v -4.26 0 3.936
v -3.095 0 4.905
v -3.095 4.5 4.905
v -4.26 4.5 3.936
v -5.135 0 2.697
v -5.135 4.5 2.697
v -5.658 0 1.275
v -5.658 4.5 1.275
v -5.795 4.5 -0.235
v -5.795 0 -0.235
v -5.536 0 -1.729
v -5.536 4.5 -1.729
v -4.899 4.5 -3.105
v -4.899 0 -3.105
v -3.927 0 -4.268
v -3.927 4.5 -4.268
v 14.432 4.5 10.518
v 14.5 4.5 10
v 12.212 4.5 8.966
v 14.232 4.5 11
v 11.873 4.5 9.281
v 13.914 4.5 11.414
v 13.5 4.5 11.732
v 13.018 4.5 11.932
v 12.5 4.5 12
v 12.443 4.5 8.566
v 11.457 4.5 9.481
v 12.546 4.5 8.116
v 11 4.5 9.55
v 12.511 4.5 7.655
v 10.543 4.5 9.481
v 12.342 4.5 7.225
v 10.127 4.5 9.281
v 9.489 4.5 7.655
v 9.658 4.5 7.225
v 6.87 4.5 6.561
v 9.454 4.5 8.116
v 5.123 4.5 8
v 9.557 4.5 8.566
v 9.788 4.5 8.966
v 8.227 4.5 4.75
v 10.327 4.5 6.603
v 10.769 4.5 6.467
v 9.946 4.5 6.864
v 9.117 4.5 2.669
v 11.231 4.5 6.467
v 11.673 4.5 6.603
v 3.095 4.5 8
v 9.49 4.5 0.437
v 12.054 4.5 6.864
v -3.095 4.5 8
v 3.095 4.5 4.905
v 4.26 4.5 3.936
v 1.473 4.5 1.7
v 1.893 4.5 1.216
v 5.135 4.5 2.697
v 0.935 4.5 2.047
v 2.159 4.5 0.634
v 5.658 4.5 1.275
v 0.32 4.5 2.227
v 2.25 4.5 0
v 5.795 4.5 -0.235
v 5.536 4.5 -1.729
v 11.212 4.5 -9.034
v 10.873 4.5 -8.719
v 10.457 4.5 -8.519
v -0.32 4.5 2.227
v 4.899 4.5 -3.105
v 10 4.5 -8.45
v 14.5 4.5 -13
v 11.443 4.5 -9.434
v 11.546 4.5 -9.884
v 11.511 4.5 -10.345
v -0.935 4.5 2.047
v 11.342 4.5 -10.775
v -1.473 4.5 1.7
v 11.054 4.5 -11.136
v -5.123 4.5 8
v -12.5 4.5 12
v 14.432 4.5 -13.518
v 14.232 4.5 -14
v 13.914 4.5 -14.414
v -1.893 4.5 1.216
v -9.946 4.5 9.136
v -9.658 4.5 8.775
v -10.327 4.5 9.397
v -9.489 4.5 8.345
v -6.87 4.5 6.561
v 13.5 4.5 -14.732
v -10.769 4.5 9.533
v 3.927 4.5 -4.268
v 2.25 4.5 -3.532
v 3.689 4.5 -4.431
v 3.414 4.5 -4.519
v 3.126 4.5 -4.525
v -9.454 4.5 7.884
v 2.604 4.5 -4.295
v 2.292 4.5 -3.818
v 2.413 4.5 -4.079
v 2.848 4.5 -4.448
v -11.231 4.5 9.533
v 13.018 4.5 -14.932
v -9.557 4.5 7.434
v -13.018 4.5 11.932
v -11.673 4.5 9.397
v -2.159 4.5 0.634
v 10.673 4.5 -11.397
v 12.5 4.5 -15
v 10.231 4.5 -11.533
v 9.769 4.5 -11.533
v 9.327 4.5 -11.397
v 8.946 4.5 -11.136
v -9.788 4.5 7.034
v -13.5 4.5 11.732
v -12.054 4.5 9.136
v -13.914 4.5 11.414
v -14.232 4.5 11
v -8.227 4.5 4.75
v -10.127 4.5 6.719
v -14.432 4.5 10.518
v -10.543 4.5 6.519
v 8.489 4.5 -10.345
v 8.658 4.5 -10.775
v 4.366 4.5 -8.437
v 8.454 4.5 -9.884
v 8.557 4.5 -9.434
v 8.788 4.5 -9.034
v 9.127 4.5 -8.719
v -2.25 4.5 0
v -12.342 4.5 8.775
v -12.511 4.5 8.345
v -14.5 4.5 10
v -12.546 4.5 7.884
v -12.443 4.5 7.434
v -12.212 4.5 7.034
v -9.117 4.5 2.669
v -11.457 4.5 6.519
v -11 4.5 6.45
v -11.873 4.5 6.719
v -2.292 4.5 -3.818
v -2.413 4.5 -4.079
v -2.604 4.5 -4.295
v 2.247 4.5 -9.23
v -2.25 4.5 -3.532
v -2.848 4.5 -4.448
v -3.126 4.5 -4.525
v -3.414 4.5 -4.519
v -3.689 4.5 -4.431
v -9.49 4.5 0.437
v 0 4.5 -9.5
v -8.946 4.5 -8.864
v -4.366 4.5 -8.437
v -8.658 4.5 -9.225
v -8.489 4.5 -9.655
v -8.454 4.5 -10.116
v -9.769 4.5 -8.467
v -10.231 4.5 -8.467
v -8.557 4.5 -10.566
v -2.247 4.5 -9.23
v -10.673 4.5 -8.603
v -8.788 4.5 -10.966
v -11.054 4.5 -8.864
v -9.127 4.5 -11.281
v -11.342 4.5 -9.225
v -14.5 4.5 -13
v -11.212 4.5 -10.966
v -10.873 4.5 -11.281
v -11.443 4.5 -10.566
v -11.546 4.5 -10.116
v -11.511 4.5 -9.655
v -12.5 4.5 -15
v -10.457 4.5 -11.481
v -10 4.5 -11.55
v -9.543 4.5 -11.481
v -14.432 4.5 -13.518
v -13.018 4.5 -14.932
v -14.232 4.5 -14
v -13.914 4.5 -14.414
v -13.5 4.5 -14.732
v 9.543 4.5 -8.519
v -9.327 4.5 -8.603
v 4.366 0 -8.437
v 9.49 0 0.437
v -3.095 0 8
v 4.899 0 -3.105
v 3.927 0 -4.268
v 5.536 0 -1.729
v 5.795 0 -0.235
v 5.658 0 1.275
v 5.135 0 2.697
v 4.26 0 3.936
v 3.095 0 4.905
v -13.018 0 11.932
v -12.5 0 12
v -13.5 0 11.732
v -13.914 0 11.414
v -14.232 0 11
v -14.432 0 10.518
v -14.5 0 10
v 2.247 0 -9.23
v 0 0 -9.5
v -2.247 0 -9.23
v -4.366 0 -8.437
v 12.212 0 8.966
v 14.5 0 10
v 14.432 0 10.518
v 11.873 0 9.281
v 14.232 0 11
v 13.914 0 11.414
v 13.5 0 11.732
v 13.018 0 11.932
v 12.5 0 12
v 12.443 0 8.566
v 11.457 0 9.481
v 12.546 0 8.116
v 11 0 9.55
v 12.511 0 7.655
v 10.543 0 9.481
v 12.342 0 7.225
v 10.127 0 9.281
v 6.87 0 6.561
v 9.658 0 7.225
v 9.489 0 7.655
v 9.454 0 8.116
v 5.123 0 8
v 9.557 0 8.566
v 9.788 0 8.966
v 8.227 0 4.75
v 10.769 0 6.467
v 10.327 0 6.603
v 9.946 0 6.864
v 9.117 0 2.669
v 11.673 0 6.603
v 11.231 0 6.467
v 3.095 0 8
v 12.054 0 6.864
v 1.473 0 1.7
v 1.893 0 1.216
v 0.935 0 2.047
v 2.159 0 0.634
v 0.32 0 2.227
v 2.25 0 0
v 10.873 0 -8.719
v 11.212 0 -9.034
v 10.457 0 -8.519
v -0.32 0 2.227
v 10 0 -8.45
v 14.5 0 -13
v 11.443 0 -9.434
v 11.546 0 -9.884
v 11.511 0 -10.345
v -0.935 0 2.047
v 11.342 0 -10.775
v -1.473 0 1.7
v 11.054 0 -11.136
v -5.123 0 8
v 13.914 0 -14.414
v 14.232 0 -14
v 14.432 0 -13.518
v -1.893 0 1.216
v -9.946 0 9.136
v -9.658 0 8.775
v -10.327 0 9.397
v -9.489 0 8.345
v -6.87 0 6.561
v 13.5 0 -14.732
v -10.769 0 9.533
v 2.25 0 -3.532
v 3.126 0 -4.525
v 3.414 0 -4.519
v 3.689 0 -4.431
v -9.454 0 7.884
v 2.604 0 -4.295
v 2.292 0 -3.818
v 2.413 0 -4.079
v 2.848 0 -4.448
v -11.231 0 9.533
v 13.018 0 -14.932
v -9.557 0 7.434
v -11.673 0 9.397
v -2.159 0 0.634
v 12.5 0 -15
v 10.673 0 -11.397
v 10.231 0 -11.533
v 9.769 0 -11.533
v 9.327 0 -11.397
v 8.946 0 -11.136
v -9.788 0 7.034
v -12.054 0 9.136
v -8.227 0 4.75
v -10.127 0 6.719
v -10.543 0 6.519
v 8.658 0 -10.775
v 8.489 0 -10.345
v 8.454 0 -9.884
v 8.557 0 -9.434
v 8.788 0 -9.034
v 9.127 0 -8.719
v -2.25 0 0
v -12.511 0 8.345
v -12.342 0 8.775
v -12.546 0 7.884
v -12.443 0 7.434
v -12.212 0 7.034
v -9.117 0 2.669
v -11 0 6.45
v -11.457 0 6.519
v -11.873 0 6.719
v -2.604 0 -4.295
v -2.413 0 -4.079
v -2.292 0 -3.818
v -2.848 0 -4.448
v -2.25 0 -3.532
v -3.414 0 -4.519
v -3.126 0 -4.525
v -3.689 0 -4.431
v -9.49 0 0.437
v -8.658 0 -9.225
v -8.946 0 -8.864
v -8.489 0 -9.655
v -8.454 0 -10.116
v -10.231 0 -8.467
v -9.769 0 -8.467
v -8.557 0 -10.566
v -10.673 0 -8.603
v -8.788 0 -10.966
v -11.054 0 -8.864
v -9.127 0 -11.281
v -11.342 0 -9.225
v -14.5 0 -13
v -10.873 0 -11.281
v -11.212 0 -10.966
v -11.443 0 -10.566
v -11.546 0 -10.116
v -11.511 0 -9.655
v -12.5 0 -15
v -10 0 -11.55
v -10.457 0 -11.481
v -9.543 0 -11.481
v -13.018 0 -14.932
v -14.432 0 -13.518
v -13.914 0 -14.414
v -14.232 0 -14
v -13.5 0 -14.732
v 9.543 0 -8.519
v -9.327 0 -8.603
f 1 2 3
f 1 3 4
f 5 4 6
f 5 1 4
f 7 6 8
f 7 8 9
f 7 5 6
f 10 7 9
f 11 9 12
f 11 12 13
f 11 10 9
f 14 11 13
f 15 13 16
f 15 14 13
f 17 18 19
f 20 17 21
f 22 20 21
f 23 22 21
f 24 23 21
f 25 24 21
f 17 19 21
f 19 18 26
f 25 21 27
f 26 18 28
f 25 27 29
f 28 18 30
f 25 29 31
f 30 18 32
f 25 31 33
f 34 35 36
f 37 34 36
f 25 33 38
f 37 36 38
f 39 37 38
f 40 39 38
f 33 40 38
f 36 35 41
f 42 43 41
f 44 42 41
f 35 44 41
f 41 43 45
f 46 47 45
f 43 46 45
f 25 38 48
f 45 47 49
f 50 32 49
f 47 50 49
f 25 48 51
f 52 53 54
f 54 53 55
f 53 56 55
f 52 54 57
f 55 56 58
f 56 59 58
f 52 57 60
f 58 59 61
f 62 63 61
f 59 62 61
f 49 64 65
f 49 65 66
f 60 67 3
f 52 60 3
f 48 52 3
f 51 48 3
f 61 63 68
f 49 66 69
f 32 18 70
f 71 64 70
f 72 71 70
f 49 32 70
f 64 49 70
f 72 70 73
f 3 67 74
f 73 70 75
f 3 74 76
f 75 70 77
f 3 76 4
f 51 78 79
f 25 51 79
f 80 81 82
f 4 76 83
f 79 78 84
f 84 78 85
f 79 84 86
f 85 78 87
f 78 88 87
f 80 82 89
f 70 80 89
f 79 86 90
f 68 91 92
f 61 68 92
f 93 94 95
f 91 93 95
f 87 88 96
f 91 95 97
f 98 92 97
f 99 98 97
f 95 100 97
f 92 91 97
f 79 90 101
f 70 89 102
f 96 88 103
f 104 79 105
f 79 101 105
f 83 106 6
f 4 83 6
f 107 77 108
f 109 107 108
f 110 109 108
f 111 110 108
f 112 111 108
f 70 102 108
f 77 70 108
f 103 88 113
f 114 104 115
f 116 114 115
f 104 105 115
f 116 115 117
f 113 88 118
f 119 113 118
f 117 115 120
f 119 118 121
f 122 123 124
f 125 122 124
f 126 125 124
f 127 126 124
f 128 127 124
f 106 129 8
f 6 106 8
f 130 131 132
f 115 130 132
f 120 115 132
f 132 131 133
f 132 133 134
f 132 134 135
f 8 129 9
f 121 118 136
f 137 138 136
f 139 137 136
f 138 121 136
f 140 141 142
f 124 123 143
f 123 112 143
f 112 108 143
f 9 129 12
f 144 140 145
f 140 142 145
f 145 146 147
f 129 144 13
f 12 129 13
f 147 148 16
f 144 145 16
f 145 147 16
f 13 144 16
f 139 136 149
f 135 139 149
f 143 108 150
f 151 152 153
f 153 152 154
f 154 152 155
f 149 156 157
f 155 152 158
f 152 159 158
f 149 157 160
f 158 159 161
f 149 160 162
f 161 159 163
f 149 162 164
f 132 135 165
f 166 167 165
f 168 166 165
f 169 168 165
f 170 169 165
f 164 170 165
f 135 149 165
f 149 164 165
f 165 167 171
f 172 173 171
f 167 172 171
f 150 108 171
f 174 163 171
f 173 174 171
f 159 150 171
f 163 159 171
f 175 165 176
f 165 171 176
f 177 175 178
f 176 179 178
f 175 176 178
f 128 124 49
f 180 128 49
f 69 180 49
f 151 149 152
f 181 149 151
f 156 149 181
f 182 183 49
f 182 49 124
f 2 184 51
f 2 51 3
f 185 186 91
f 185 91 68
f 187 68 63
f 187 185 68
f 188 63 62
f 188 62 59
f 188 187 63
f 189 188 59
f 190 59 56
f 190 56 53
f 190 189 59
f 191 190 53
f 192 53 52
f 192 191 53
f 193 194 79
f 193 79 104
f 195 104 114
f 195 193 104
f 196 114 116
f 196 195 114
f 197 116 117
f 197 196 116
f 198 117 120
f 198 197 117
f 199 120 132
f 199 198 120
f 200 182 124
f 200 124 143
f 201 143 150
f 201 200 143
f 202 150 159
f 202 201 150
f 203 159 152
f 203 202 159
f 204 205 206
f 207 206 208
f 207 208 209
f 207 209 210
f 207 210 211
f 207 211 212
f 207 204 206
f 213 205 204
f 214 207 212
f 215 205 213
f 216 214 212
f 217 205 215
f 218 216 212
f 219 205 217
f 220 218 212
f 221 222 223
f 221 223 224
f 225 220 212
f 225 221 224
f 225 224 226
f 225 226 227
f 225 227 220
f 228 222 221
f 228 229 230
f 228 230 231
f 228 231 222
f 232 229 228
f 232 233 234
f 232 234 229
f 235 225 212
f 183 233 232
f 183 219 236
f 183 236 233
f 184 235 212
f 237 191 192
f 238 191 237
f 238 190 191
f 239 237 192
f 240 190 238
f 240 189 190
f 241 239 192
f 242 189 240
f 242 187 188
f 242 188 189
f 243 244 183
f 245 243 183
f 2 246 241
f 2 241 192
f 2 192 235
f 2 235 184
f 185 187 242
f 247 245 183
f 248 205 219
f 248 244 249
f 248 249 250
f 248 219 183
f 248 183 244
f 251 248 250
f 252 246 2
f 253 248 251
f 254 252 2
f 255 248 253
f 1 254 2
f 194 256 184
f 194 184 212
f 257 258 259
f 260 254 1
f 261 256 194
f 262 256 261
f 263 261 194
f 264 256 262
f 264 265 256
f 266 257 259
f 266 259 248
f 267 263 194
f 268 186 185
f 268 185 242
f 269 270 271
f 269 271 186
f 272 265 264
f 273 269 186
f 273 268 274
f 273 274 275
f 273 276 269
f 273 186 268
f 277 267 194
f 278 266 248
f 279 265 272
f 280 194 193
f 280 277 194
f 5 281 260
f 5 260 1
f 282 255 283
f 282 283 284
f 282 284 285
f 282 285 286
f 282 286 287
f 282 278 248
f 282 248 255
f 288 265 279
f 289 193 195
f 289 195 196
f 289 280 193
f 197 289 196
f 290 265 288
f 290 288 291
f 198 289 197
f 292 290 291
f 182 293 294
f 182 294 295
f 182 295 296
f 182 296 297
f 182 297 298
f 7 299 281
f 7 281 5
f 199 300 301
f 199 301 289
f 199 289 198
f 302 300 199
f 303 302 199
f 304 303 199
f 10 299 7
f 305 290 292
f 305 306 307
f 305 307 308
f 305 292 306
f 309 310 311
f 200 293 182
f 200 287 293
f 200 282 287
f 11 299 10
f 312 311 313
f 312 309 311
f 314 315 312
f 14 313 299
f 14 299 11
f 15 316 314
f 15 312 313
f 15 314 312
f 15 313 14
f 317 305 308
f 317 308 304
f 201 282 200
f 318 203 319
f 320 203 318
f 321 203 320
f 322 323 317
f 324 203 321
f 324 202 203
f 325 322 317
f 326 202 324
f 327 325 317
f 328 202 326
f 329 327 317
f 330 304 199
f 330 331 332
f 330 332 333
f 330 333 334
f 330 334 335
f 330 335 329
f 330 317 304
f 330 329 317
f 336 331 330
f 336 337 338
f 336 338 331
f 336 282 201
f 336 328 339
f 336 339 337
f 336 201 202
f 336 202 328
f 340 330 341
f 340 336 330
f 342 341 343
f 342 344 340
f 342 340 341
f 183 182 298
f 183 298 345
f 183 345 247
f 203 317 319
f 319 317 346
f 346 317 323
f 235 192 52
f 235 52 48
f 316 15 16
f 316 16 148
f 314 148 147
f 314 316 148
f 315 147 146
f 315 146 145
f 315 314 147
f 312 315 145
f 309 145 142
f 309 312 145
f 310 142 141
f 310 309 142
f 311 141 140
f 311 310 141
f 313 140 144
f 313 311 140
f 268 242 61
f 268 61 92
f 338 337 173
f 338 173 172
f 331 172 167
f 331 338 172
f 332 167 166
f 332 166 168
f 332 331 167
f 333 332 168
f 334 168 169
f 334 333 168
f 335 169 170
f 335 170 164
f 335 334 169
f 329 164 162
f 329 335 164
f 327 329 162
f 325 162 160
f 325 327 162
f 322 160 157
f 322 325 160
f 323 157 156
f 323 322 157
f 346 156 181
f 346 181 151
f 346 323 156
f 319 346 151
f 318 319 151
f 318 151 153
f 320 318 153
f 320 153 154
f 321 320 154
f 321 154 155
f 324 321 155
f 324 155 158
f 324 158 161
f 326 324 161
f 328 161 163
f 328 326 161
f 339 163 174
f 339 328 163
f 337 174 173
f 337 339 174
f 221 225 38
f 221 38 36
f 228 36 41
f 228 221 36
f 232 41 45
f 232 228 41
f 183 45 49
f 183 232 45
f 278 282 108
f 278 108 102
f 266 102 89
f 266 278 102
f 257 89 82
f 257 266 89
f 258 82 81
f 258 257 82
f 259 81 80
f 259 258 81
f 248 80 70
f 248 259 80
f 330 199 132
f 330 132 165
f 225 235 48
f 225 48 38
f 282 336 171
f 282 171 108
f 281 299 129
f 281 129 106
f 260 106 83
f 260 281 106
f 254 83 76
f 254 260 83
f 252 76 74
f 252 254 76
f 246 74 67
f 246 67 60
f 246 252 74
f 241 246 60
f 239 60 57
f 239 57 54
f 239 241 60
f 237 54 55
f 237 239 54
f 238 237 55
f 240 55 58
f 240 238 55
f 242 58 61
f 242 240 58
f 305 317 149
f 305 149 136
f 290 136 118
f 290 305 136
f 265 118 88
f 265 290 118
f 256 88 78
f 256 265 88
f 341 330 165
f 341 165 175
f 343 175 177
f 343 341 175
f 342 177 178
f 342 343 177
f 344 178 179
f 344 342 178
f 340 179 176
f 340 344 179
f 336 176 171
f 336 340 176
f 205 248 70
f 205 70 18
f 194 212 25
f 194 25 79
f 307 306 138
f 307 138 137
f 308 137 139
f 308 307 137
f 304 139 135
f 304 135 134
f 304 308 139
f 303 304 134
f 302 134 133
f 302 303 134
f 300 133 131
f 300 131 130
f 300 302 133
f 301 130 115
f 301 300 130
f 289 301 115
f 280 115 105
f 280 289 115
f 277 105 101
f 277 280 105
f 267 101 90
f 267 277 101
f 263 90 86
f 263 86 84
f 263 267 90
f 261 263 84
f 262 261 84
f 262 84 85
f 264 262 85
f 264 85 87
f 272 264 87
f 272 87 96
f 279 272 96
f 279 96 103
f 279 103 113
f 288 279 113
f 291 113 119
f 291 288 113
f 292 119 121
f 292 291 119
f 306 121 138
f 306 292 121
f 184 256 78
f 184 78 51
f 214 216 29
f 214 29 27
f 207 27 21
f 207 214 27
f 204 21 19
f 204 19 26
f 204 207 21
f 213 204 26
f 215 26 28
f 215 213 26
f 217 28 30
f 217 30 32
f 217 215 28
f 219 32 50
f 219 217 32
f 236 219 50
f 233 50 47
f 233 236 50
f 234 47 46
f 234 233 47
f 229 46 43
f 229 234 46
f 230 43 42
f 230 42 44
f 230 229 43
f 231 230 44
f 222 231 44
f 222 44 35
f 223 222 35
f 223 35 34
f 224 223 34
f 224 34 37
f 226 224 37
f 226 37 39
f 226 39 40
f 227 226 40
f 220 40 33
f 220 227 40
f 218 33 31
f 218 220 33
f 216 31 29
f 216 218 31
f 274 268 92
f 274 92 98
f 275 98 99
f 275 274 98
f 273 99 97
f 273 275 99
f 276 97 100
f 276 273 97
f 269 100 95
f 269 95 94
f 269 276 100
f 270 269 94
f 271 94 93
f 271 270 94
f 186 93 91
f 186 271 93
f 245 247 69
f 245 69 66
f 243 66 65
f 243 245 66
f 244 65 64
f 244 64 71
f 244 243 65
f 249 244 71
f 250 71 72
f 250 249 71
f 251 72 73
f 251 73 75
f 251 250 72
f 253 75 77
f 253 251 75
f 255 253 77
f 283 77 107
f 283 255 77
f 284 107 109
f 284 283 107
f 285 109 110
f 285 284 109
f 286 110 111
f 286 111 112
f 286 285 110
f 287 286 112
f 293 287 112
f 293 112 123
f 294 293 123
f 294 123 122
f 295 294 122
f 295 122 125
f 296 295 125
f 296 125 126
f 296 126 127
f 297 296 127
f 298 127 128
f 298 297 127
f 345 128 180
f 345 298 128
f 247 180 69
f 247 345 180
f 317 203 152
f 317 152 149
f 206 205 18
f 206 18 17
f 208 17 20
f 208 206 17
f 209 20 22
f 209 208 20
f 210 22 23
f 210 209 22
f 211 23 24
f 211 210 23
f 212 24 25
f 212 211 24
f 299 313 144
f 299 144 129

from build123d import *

# Parameters (mm, degrees)
SKETCH3_R           = 1.55
BOSS_EXTRUDE1_DEPTH = 4.5


with BuildPart() as part:
    # Sketch3 → Boss-Extrude1 (new body)
    with BuildSketch(Plane(origin=(0, 0, 0), x_dir=(1, 0, 0), z_dir=(0, 1, 0))):
        with BuildLine():
            Line((-14.5, -10), (-14.5, 13))
            ThreePointArc((-14.5, 13), (-13.914213562, 14.414213562), (-12.5, 15))
            Line((-12.5, 15), (12.5, 15))
            ThreePointArc((12.5, 15), (13.914213562, 14.414213562), (14.5, 13))
            Line((14.5, 13), (14.5, -10))
            ThreePointArc((14.5, -10), (13.914213562, -11.414213562), (12.5, -12))
            Line((12.5, -12), (-12.5, -12))
            ThreePointArc((-12.5, -12), (-13.914213562, -11.414213562), (-14.5, -10))
        make_face()
        with Locations(Location((10, 10, 0), (0, 0, 270))):
            Circle(SKETCH3_R, mode=Mode.SUBTRACT)
        with Locations(Location((11, -8, 0), (0, 0, 270))):
            Circle(SKETCH3_R, mode=Mode.SUBTRACT)
        with Locations(Location((-11, -8, 0), (0, 0, 90))):
            Circle(SKETCH3_R, mode=Mode.SUBTRACT)
        with Locations(Location((-10, 10, 0), (0, 0, 90))):
            Circle(SKETCH3_R, mode=Mode.SUBTRACT)
        with BuildLine():
            Line((3.094753625, -4.905354218), (3.094753625, -8))
            Line((3.094753625, -8), (5.123475383, -8))
            ThreePointArc((5.123475383, -8), (8.227241336, -4.75), (9.489940922, -0.437059837))
            Line((9.489940922, -0.437059837), (4.366465539, 8.437059837))
            ThreePointArc((4.366465539, 8.437059837), (0, 9.5), (-4.366465539, 8.437059837))
            Line((-4.366465539, 8.437059837), (-9.489940922, -0.437059837))
            ThreePointArc((-9.489940922, -0.437059837), (-8.227241336, -4.75), (-5.123475383, -8))
            Line((-5.123475383, -8), (-3.094753625, -8))
            Line((-3.094753625, -8), (-3.094753625, -4.905354218))
            ThreePointArc((-3.094753625, -4.905354218), (-5.776273327, -0.524086301), (-3.927083333, 4.268256845))
            ThreePointArc((-3.927083333, 4.268256845), (-2.848181218, 4.4480697), (-2.25, 3.532350492))
            Line((-2.25, 3.532350492), (-2.25, 0))
            ThreePointArc((-2.25, 0), (0, -2.25), (2.25, 0))
            Line((2.25, 0), (2.25, 3.532350492))
            ThreePointArc((2.25, 3.532350492), (2.848181218, 4.4480697), (3.927083333, 4.268256845))
            ThreePointArc((3.927083333, 4.268256845), (5.776273327, -0.524086301), (3.094753625, -4.905354218))
        make_face(mode=Mode.SUBTRACT)
    extrude(amount=BOSS_EXTRUDE1_DEPTH)


solid = part.part
